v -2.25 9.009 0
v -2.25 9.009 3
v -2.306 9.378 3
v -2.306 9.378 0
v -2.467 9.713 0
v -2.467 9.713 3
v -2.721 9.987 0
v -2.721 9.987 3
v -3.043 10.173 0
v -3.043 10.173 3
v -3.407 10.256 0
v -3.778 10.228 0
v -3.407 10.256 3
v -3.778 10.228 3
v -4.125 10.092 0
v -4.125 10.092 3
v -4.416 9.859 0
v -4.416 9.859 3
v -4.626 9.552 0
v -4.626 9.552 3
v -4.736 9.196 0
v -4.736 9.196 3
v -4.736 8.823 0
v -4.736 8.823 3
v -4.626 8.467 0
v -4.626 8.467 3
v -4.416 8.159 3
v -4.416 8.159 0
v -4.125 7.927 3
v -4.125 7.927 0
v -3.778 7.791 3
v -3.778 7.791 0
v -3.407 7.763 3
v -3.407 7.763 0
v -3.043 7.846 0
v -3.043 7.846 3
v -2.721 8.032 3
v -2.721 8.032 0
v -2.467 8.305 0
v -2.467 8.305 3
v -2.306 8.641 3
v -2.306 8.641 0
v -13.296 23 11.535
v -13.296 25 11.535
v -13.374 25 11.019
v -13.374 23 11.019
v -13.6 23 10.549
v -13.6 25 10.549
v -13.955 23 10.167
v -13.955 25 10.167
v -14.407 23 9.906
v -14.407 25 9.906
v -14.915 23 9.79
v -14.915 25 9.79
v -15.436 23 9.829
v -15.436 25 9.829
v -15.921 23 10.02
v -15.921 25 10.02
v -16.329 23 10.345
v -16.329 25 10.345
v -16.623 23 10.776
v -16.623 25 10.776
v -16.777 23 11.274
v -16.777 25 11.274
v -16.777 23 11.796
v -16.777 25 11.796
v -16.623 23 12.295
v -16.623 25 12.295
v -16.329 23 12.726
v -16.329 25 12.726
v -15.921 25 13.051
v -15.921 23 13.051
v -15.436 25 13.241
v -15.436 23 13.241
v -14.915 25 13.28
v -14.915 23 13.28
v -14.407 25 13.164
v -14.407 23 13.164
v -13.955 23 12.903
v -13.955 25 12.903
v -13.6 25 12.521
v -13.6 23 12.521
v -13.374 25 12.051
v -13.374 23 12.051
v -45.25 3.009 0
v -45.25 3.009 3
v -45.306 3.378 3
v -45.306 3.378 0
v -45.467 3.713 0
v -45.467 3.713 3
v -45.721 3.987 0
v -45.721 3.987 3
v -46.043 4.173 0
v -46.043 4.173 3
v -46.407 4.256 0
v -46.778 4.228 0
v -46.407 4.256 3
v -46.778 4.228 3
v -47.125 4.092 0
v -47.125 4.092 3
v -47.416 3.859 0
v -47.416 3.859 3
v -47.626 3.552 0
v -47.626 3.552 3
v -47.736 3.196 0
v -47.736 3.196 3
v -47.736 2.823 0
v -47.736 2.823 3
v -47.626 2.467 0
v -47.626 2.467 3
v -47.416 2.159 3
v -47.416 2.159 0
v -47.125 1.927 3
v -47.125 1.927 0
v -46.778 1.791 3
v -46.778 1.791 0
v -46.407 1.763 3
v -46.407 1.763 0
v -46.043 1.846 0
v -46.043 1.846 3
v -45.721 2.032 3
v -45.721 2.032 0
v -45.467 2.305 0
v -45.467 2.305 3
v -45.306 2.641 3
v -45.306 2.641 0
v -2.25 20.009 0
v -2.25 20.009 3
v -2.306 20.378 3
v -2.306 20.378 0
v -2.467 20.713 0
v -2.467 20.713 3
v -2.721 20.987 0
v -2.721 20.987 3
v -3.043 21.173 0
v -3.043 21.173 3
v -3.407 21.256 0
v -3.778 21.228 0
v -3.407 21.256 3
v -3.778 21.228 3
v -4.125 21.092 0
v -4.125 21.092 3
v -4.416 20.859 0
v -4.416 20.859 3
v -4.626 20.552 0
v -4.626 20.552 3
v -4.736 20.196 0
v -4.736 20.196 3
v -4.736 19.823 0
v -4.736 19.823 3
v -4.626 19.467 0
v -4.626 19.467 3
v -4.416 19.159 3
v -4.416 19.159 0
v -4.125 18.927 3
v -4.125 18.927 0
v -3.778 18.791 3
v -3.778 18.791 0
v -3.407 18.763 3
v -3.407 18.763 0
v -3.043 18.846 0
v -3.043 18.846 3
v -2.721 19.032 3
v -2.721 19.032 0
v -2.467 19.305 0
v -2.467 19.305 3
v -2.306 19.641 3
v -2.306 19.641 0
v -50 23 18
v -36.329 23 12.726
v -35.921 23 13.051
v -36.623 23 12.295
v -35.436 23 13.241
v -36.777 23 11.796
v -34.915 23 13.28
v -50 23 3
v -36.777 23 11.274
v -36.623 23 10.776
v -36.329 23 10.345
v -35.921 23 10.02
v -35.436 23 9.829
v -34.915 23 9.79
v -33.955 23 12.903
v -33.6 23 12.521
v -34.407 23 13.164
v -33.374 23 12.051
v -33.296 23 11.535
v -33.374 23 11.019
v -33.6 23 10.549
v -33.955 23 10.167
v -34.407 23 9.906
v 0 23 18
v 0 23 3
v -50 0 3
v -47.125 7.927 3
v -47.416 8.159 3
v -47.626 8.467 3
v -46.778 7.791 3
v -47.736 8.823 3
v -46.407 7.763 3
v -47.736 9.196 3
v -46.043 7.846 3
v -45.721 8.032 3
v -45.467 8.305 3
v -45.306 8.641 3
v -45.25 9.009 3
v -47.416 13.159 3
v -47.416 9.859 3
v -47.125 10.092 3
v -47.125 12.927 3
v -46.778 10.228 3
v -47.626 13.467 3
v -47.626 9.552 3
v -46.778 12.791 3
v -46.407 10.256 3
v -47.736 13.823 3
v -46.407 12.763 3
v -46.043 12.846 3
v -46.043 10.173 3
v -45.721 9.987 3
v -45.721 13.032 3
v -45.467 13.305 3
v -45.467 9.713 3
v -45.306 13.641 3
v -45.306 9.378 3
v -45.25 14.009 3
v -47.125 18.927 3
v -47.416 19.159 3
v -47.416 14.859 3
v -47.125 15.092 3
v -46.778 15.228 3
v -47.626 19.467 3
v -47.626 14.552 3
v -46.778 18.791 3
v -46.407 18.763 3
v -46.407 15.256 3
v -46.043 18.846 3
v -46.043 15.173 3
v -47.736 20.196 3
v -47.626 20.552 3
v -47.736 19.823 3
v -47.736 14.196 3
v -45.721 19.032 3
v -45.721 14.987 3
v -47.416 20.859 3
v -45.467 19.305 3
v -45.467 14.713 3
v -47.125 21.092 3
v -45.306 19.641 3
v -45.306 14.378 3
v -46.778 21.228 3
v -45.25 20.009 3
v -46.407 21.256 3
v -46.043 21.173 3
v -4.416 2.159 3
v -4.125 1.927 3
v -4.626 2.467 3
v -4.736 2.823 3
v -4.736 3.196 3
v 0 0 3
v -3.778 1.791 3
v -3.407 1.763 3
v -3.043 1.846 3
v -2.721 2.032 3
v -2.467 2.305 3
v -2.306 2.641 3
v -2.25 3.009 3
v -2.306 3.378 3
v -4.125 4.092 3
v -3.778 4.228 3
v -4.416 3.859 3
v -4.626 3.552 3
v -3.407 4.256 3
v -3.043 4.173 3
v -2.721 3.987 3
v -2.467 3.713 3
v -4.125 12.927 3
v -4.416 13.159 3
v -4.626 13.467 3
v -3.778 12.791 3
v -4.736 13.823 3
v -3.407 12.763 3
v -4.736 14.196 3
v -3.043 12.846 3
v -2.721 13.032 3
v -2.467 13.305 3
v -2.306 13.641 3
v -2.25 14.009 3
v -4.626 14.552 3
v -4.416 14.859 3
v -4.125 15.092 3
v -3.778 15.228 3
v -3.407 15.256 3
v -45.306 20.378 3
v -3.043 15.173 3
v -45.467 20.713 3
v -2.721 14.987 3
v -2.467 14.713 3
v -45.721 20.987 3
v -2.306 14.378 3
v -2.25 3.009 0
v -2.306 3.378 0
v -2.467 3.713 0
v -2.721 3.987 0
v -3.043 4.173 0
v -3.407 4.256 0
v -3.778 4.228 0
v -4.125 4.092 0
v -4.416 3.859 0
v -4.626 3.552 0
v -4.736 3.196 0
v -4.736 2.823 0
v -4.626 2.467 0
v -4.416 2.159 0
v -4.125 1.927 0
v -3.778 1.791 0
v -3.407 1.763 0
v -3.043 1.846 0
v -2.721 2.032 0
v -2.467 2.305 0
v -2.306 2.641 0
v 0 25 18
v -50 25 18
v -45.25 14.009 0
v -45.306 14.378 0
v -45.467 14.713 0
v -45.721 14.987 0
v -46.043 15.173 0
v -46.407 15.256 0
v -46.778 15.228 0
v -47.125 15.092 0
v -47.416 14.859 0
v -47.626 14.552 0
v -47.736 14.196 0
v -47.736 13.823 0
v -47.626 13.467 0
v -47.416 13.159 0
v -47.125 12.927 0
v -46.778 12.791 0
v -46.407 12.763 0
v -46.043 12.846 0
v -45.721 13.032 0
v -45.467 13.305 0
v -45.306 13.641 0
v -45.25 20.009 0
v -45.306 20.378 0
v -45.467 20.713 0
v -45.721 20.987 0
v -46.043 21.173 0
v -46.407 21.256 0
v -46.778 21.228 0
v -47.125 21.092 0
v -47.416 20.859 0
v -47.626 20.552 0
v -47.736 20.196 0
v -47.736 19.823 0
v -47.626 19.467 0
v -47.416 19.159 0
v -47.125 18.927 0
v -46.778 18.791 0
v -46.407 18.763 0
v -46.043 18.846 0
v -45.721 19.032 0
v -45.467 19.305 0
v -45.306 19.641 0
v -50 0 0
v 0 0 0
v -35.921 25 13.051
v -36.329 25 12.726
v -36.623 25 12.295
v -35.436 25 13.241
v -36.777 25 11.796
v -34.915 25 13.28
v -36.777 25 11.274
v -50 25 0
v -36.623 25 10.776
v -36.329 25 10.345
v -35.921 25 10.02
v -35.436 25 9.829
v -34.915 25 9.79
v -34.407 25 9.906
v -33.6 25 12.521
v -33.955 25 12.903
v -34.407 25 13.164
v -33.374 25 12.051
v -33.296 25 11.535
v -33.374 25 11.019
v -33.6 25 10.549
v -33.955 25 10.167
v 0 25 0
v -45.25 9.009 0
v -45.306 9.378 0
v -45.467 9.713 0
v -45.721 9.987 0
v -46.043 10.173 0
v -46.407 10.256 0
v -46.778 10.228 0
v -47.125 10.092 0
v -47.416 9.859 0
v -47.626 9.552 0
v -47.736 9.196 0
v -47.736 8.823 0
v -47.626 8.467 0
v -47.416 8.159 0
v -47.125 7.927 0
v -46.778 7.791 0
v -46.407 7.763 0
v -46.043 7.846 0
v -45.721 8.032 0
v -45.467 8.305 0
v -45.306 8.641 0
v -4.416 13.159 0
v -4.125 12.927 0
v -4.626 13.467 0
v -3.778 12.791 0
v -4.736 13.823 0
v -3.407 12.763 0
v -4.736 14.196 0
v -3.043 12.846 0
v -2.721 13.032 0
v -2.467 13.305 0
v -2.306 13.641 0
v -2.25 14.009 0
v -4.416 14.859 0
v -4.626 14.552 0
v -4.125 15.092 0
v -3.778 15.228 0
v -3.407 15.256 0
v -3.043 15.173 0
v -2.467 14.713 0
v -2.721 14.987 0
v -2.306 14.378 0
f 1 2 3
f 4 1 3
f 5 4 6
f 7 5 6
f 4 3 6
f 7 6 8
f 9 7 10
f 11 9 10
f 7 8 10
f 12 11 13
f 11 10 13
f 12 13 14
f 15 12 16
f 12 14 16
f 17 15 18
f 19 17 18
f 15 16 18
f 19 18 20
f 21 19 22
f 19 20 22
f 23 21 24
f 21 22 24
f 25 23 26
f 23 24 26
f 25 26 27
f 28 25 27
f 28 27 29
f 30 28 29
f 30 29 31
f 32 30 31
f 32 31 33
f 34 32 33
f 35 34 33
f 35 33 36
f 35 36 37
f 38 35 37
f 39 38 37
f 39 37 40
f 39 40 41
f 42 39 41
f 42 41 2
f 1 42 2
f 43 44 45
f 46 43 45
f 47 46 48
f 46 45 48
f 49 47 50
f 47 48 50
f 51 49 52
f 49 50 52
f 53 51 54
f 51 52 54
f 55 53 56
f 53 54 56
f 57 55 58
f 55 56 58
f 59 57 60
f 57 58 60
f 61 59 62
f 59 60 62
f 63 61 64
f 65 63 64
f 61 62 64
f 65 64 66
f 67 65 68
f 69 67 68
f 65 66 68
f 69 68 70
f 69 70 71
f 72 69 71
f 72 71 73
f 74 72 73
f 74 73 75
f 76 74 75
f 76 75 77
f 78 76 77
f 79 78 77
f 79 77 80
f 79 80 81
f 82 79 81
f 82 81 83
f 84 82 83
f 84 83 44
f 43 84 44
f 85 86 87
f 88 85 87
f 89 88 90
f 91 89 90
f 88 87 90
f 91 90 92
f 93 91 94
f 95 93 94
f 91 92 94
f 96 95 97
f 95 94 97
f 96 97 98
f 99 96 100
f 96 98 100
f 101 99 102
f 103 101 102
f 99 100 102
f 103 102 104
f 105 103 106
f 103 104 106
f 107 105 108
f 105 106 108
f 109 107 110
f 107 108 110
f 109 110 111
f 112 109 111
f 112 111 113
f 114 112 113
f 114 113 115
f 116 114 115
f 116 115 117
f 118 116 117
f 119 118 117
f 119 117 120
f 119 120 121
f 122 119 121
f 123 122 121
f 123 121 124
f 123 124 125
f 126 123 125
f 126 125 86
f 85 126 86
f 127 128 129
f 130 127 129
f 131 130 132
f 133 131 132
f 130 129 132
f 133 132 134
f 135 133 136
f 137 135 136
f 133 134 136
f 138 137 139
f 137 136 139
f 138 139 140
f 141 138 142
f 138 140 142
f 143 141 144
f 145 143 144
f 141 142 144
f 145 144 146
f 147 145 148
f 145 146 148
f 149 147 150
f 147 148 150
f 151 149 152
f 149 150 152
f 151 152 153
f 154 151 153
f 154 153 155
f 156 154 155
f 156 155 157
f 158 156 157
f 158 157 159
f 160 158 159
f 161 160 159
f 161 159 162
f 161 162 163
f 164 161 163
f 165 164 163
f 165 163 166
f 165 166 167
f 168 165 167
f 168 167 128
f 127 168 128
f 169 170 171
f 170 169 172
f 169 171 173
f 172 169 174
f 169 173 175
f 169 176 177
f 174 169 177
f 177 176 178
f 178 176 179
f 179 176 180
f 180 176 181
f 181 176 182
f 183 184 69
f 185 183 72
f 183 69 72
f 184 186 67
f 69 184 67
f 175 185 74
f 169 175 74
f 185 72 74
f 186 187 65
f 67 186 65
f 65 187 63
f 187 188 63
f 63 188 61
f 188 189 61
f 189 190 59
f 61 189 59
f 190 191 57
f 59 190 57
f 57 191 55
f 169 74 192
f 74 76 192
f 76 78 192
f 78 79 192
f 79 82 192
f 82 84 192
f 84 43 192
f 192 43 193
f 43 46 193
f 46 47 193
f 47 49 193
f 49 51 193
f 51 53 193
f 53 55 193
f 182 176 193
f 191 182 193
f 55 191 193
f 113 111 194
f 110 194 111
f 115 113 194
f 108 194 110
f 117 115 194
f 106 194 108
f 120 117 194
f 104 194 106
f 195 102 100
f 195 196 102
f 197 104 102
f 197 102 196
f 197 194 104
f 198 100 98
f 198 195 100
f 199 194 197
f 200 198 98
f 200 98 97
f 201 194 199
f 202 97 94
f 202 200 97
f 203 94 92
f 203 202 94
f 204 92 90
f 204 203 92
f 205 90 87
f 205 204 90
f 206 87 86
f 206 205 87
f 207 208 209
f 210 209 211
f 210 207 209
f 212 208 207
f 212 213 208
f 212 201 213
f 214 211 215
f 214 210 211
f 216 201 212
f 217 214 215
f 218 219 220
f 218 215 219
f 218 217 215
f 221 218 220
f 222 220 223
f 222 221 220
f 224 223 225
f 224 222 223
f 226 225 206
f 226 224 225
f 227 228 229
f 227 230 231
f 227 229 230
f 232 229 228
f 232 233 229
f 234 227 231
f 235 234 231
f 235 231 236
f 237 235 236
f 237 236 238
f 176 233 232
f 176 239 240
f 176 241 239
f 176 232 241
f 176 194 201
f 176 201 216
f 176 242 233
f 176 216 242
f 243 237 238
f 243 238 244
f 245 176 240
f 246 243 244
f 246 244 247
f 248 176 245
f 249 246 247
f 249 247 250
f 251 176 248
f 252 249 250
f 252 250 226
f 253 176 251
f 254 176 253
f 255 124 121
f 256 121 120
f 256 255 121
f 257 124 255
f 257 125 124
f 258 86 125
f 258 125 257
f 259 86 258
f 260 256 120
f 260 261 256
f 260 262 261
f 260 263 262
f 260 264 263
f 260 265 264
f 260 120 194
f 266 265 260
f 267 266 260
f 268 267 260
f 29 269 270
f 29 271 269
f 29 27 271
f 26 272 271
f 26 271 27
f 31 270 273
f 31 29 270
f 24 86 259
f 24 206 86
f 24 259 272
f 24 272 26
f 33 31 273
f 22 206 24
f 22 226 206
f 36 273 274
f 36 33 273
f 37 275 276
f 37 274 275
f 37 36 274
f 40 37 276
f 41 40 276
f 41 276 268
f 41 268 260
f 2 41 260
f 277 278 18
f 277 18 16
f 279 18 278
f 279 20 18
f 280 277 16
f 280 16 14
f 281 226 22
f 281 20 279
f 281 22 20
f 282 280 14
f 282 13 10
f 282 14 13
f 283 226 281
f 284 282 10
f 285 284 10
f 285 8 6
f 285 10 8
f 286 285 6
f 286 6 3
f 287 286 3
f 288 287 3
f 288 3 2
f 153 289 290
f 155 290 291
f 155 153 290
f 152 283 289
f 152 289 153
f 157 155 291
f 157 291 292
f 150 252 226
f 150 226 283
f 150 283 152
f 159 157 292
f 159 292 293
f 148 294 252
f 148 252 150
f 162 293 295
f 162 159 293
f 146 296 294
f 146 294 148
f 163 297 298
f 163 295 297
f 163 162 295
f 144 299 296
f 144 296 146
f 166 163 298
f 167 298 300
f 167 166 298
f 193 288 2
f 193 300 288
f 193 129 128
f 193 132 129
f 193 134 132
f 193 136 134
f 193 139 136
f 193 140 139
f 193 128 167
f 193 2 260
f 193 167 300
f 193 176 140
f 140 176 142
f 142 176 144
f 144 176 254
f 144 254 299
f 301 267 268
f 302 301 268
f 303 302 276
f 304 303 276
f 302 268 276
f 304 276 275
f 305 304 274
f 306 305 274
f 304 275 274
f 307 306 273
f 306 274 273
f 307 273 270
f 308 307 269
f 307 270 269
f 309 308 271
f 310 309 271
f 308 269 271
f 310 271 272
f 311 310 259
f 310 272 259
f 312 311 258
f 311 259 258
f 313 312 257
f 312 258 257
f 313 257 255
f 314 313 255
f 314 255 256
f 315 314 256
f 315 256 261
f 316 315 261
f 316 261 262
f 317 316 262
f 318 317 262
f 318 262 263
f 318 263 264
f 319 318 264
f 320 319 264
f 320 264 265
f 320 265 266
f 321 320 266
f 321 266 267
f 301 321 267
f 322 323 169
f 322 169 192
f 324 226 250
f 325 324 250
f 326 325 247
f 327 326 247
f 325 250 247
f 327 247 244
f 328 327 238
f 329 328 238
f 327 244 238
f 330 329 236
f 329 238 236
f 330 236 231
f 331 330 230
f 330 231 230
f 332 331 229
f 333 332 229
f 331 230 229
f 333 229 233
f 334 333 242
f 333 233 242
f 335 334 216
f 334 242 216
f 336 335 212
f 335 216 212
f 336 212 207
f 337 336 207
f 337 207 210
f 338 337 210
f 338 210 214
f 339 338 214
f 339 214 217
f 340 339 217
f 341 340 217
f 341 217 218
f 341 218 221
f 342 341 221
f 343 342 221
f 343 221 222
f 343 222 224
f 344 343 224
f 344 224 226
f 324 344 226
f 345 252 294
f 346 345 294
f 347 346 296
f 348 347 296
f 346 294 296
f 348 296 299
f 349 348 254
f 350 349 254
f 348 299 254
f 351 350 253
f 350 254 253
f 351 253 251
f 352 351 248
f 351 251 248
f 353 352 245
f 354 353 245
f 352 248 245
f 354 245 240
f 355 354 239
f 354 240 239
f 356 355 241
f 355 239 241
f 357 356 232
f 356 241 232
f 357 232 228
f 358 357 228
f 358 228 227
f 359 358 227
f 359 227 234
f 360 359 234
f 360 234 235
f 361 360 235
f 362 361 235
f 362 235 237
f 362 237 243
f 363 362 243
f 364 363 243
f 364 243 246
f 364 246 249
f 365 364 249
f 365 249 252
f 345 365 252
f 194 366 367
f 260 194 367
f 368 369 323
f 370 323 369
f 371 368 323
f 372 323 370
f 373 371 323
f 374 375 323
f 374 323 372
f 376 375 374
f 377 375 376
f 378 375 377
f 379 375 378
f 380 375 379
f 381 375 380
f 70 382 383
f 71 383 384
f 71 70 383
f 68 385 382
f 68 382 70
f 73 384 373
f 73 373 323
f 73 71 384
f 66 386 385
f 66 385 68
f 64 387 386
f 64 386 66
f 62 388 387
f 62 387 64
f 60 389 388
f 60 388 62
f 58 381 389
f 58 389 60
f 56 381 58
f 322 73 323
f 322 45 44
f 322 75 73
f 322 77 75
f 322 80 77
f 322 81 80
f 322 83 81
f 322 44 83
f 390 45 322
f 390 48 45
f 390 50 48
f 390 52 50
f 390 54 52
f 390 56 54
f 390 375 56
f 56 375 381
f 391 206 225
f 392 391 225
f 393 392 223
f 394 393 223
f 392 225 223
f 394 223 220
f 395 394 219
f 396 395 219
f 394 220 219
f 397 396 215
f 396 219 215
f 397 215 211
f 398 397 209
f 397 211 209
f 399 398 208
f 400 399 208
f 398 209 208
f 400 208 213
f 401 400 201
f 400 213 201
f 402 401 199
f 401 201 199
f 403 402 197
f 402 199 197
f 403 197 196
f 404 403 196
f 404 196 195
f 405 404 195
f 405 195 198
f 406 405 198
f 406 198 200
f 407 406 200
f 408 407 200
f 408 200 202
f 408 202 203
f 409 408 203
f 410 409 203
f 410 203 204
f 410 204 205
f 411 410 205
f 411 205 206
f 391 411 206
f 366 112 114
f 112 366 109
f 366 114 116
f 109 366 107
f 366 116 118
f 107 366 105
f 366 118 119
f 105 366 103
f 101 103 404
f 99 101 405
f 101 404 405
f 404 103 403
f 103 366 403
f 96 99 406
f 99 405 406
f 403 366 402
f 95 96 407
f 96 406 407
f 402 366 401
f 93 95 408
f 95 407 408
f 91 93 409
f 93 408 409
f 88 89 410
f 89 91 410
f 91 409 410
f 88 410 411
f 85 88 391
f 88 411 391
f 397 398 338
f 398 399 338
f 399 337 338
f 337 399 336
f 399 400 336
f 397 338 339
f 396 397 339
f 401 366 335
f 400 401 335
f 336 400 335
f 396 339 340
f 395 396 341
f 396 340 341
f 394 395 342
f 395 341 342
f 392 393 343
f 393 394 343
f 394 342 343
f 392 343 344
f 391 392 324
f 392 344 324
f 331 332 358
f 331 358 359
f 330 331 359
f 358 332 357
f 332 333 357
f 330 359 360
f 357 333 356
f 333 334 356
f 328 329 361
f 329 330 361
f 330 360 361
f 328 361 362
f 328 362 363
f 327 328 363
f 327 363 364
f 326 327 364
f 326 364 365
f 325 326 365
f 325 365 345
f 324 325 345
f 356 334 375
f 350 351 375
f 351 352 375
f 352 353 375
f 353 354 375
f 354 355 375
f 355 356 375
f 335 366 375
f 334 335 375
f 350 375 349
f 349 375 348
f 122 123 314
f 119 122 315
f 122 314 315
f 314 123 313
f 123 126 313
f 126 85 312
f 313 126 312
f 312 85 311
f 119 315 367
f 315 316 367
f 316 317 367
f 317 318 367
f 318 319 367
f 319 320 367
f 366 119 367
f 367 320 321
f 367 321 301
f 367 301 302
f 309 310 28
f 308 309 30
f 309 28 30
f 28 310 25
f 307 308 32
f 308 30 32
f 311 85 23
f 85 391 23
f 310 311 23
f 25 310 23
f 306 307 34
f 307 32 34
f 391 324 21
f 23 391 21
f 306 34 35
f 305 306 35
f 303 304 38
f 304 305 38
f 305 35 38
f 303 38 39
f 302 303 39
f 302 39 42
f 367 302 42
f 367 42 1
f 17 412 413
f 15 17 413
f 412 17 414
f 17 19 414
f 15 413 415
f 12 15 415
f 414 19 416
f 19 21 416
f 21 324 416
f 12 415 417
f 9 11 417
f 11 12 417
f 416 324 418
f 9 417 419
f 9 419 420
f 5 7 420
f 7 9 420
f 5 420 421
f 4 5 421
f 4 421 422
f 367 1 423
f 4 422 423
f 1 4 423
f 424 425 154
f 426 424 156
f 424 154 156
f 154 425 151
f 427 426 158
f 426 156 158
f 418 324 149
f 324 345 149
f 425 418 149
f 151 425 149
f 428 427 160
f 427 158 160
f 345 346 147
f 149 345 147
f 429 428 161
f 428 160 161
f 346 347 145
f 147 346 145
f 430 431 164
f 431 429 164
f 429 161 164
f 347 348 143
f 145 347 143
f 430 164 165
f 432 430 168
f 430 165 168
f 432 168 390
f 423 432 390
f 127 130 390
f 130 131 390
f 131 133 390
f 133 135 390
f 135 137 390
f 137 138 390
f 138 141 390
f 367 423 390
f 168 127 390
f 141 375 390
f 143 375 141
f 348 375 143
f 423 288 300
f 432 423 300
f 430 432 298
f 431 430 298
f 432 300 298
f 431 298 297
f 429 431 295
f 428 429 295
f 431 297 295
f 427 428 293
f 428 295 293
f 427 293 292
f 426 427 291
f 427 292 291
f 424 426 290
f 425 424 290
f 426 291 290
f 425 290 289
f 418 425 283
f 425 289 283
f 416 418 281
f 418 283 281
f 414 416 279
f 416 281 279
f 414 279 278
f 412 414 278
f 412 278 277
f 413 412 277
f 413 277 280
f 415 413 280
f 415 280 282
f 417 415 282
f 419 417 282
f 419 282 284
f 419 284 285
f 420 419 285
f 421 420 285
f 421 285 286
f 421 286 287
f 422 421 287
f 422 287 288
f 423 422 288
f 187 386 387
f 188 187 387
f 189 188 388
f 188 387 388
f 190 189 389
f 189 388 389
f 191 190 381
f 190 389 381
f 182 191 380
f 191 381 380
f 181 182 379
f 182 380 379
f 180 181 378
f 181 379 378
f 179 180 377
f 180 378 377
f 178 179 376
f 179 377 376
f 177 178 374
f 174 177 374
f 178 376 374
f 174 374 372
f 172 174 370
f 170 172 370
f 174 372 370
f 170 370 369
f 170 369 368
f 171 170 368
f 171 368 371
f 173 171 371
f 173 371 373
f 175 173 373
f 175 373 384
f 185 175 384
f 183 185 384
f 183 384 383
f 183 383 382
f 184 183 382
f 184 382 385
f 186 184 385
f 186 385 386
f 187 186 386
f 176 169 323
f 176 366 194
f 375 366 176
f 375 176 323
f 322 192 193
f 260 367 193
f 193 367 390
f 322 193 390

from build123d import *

# Parameters (mm, degrees)
SKETCH1_W           = 50
SKETCH1_H           = 25
BOSS_EXTRUDE1_DEPTH = 3
SKETCH3_W           = 50
SKETCH3_H           = 2
BOSS_EXTRUDE2_DEPTH = 15
SKETCH5_R           = 1.25
CUT_EXTRUDE1_DEPTH  = 15
SKETCH6_R           = 1.75
CUT_EXTRUDE2_DEPTH  = 15


with BuildPart() as part:
    # Sketch1 → Boss-Extrude1 (new body)
    with BuildSketch(Plane.XY):
        with Locations((-25, 12.5)):
            Rectangle(SKETCH1_W, SKETCH1_H)
    extrude(amount=BOSS_EXTRUDE1_DEPTH)

    # Sketch3 → Boss-Extrude2 (add)
    with BuildSketch(Plane.XY.offset(3)):
        with Locations((-25, 24)):
            Rectangle(SKETCH3_W, SKETCH3_H)
    extrude(amount=BOSS_EXTRUDE2_DEPTH)

    # Sketch5 → Cut-Extrude1 (cut)
    with BuildSketch(Plane.XY.offset(3)):
        with Locations((-46.500140762, 20.00924034)):
            Circle(SKETCH5_R)
        with Locations((-46.500140762, 3.00924034)):
            Circle(SKETCH5_R)
        with Locations((-3.500140762, 20.00924034)):
            Circle(SKETCH5_R)
        with Locations((-3.500140762, 3.00924034)):
            Circle(SKETCH5_R)
        with Locations((-3.500140762, 14.00924034)):
            Circle(SKETCH5_R)
        with Locations((-46.500140762, 14.00924034)):
            Circle(SKETCH5_R)
        with Locations((-3.500140762, 9.00924034)):
            Circle(SKETCH5_R)
        with Locations((-46.500140762, 9.00924034)):
            Circle(SKETCH5_R)
    extrude(amount=-CUT_EXTRUDE1_DEPTH, mode=Mode.SUBTRACT)

    # Sketch6 → Cut-Extrude2 (cut)
    with BuildSketch(Plane(origin=(0, 25, 0), x_dir=(1, 0, 0), z_dir=(0, 1, 0))):
        with Locations((-35.046148944, -11.535217426)):
            Circle(SKETCH6_R)
        with Locations((-15.046148944, -11.535217426)):
            Circle(SKETCH6_R)
    extrude(amount=-CUT_EXTRUDE2_DEPTH, mode=Mode.SUBTRACT)


solid = part.part
